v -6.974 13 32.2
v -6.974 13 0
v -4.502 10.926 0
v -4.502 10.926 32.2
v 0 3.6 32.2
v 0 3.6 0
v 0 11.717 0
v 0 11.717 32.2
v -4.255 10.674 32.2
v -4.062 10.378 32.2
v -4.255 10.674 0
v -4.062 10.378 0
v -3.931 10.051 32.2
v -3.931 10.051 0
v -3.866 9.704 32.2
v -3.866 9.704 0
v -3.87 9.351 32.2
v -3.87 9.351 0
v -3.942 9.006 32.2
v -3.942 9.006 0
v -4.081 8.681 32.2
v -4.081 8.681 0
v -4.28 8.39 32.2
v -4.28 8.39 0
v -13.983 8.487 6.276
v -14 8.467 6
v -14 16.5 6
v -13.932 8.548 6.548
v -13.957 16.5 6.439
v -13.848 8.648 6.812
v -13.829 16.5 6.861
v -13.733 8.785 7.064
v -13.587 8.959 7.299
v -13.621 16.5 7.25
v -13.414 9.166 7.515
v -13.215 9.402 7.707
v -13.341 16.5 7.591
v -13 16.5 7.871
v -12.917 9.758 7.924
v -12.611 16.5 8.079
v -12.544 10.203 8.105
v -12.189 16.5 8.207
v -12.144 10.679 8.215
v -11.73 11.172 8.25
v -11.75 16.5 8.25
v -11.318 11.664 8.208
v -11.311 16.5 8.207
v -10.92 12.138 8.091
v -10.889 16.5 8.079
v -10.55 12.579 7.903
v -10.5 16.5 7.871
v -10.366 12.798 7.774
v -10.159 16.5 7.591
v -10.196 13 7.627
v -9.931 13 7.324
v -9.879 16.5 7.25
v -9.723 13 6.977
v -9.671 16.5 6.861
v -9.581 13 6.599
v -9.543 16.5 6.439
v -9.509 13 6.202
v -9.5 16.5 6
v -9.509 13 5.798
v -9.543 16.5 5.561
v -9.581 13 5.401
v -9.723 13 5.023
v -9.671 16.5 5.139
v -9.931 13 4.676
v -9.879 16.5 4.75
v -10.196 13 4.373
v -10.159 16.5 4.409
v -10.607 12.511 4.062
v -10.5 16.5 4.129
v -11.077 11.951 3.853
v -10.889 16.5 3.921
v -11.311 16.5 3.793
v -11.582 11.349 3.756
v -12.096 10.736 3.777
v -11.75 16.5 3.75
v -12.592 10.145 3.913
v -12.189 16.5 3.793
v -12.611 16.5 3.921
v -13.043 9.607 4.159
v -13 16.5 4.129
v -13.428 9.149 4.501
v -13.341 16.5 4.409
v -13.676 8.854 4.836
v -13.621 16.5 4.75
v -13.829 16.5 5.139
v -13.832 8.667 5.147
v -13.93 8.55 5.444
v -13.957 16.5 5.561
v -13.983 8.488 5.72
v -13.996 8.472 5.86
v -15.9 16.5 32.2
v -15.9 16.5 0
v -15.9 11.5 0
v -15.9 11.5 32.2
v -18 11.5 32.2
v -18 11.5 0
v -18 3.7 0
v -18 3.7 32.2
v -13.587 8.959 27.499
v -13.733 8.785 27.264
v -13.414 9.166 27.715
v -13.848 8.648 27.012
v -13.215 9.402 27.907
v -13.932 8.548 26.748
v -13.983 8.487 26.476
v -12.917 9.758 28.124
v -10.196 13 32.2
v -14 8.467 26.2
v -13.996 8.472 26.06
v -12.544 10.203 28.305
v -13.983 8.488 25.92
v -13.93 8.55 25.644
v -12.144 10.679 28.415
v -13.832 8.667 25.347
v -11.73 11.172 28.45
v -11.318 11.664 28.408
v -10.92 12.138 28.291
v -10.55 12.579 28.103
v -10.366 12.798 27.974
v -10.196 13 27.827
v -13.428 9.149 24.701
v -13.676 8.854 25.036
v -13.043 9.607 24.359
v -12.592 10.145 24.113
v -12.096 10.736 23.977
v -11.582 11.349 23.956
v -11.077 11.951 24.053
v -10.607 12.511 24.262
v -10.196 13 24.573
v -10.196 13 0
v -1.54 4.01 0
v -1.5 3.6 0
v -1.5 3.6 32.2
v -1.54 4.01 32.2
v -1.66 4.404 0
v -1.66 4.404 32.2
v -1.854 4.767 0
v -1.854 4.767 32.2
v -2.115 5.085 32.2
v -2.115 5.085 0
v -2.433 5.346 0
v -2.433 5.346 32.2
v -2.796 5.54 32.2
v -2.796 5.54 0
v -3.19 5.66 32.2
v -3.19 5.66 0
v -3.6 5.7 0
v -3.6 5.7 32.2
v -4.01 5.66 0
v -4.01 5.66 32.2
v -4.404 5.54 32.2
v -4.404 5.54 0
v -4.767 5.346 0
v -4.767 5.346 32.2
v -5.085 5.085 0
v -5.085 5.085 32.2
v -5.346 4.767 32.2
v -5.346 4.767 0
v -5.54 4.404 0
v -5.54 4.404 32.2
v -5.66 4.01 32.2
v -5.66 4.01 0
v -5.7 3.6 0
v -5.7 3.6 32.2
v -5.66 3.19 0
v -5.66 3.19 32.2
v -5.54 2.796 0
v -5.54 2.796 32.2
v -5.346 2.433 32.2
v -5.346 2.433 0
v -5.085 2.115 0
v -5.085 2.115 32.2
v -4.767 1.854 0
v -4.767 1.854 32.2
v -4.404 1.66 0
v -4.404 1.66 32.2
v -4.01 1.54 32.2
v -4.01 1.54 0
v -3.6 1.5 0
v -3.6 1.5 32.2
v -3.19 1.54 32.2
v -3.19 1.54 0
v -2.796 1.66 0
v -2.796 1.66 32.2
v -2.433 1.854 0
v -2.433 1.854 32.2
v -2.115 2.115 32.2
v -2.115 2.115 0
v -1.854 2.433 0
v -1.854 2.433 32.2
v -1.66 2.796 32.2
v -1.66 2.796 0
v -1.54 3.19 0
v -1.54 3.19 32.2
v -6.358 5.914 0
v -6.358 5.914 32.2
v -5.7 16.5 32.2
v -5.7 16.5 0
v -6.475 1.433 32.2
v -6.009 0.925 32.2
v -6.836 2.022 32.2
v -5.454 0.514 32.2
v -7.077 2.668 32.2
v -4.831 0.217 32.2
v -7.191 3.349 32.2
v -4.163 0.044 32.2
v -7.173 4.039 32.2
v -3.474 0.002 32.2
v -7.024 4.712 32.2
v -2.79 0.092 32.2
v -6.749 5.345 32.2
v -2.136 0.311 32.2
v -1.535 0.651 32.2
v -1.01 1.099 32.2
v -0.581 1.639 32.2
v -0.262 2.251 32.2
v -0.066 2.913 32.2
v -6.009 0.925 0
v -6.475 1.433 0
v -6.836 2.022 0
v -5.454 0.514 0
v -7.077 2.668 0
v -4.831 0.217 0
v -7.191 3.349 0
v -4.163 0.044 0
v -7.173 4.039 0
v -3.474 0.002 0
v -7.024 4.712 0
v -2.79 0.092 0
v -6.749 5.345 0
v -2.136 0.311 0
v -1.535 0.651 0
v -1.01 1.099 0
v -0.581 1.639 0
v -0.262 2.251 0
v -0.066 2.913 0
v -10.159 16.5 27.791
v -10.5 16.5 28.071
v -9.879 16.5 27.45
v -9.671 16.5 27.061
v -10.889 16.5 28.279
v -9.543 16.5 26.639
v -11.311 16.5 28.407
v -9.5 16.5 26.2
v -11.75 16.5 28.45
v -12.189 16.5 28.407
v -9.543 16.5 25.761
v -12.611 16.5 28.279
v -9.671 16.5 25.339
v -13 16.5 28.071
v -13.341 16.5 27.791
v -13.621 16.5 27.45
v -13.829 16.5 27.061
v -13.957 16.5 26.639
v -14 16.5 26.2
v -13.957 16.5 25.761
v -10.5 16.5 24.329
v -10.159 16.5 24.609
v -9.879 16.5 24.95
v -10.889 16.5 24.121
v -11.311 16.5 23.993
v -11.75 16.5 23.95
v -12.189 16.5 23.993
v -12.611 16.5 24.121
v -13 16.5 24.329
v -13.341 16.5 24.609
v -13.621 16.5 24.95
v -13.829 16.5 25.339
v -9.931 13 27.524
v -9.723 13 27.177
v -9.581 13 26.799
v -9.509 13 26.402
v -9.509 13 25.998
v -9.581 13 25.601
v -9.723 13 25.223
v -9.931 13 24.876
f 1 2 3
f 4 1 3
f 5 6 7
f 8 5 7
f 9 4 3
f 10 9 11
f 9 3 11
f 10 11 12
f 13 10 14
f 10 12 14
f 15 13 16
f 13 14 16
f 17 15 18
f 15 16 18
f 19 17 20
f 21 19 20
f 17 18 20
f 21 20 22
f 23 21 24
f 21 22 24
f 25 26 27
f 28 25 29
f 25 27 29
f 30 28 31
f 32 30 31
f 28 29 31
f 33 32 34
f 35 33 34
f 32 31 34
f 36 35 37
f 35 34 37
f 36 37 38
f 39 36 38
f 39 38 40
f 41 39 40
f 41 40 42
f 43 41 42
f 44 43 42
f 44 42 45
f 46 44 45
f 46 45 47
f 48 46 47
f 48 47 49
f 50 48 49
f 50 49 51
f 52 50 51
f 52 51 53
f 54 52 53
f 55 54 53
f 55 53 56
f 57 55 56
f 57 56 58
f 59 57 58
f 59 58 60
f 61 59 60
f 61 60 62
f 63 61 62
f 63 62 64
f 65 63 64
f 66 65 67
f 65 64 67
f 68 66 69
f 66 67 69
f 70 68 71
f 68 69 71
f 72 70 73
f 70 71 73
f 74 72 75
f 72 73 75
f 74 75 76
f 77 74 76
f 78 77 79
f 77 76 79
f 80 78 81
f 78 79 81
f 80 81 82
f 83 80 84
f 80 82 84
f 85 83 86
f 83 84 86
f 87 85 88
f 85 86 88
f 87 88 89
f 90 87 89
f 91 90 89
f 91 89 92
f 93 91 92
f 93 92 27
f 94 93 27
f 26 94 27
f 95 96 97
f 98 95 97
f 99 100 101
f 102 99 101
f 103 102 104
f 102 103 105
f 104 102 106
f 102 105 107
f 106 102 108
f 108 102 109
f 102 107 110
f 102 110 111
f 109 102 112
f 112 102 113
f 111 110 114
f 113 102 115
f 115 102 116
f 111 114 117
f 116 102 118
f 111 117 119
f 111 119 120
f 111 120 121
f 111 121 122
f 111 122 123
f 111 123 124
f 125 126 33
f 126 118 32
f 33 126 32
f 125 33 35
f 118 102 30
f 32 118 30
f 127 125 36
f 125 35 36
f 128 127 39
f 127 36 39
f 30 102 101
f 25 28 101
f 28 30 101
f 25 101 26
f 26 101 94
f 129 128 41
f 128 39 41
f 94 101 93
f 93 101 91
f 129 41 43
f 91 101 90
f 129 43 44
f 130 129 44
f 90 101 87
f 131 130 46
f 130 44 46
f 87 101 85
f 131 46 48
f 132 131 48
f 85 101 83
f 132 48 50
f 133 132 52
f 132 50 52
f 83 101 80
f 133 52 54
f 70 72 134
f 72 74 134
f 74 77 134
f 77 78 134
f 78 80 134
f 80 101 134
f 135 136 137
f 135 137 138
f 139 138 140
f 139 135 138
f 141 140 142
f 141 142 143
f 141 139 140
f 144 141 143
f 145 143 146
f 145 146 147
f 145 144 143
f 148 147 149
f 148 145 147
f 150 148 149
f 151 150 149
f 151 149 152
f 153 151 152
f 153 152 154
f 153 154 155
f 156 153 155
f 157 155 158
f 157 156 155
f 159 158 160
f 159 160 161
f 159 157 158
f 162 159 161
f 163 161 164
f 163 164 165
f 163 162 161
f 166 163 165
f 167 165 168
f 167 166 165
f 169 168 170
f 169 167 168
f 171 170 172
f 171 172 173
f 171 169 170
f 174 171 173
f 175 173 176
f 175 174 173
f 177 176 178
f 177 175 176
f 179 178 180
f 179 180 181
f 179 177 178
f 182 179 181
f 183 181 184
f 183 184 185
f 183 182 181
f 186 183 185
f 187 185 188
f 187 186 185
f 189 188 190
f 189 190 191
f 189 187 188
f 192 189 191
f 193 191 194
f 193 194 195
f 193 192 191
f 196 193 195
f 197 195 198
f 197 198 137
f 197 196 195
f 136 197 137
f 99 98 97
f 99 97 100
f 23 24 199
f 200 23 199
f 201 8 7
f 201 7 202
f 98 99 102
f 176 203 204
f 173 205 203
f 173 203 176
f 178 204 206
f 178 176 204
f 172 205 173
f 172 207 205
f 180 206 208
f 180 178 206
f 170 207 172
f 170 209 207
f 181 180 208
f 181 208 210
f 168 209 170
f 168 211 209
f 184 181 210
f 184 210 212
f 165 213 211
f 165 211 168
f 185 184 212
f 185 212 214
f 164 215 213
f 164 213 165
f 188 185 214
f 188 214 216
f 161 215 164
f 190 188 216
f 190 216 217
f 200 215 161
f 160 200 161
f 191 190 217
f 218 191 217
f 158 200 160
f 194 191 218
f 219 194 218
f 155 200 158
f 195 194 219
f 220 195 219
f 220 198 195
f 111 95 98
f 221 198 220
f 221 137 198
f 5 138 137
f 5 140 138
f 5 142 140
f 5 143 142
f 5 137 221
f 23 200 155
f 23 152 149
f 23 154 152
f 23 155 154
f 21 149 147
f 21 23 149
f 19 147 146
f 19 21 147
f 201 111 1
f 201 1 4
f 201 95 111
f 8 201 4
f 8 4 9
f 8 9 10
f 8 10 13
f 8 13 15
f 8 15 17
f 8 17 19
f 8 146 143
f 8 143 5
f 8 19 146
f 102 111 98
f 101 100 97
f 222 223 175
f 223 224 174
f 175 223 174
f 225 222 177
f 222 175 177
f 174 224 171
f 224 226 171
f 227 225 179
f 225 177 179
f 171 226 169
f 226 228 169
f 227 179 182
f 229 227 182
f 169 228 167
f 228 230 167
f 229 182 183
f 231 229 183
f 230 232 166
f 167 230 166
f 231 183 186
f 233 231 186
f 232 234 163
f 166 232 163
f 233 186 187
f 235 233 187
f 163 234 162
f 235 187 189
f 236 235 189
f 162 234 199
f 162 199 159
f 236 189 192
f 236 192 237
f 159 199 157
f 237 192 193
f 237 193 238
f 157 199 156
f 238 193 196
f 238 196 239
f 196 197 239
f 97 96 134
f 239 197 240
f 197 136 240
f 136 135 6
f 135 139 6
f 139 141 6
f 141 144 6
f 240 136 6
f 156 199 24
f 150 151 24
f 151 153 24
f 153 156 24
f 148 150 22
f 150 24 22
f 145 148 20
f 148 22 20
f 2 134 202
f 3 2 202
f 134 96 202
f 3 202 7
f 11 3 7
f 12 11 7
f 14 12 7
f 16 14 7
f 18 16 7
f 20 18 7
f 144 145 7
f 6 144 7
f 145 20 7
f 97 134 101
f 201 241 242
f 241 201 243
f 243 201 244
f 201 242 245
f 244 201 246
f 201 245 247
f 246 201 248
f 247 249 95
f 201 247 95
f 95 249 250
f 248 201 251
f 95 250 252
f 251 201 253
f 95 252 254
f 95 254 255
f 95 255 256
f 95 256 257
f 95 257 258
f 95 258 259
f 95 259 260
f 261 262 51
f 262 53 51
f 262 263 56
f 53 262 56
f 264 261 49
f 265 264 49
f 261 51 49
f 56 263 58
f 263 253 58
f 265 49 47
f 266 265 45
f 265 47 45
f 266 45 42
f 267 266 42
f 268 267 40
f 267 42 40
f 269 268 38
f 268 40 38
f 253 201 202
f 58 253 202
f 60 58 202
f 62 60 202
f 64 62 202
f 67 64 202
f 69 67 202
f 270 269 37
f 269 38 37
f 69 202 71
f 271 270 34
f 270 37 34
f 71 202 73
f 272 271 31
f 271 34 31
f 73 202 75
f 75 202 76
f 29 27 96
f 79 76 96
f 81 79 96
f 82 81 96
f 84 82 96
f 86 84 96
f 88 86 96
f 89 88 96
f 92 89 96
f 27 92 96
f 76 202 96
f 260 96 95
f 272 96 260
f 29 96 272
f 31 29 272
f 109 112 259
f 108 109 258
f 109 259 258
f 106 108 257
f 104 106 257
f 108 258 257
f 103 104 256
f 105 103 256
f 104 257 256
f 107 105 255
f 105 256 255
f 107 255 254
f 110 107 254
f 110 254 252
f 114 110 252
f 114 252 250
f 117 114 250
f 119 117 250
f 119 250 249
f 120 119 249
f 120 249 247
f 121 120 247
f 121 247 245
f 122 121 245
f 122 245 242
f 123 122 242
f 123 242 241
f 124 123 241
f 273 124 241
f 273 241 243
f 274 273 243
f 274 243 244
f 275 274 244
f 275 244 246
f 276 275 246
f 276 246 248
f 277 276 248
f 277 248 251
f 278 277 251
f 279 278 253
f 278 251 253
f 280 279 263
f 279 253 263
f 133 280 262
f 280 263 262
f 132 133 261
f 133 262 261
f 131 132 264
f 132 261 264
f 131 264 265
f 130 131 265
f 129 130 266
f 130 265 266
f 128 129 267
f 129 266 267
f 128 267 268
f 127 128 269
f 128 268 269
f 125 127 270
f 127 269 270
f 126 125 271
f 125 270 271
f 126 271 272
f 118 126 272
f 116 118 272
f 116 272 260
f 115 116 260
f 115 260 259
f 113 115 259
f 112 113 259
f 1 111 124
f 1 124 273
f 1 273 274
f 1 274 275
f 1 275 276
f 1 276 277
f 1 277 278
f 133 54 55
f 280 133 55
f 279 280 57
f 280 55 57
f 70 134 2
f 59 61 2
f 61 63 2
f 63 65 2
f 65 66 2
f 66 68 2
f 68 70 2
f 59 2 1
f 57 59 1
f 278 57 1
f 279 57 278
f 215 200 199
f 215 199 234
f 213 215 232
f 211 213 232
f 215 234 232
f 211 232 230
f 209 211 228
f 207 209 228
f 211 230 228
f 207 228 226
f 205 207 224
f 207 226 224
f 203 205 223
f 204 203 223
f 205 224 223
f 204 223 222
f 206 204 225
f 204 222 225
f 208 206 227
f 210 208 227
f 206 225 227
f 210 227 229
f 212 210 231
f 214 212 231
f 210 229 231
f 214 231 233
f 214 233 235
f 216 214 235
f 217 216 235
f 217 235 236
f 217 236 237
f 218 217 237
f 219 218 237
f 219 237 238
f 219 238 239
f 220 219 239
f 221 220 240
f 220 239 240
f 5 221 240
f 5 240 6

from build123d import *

# Parameters (mm, degrees)
F0_R     = 2.1
F1_DEPTH = 32.2
F2_R     = 2.25
F3_DEPTH = 16.501


with BuildPart() as f1:
    # F0 (on Top) → F1 (new body)
    with BuildSketch(Plane.XY):
        with BuildLine():
            Line((-5.7, 16.5), (-15.9, 16.5))
            Line((-15.9, 16.5), (-15.9, 11.5))
            Line((-15.9, 11.5), (-18, 11.5))
            Line((-18, 11.5), (-18, 3.7))
            Line((-18, 3.7), (-10.196373, 13))
            Line((-10.196373, 13), (-6.973896, 13))
            Line((-6.973896, 13), (-4.502056, 10.92588))
            ThreePointArc((-4.502056, 10.92588), (-3.865923, 9.70388), (-4.280194, 8.389982))
            Line((-4.280194, 8.389982), (-6.35776, 5.914035))
            ThreePointArc((-6.35776, 5.914035), (-2.368727, 6.982893), (0, 3.6))
            Line((0, 3.6), (0, 11.717132))
            Line((0, 11.717132), (-5.7, 16.5))
        make_face()
        with BuildLine():
            ThreePointArc((-6.35776, 5.914035), (-4.831273, 0.217107), (0, 3.6))
            ThreePointArc((0, 3.6), (-2.368727, 6.982893), (-6.35776, 5.914035))
        make_face()
        with Locations((-3.6, 3.6)):
            Circle(F0_R, mode=Mode.SUBTRACT)
    extrude(amount=F1_DEPTH)

    # F2 (on face) → F3 (cut, through all)
    with BuildSketch(Plane(origin=(0, 16.5, 0), x_dir=(-1, 0, 0), z_dir=(0, 1, 0))):
        with Locations((11.75, 26.2)):
            Circle(F2_R)
        with Locations((11.75, 6)):
            Circle(F2_R)
    extrude(amount=-F3_DEPTH, mode=Mode.SUBTRACT)


solid = f1.part
